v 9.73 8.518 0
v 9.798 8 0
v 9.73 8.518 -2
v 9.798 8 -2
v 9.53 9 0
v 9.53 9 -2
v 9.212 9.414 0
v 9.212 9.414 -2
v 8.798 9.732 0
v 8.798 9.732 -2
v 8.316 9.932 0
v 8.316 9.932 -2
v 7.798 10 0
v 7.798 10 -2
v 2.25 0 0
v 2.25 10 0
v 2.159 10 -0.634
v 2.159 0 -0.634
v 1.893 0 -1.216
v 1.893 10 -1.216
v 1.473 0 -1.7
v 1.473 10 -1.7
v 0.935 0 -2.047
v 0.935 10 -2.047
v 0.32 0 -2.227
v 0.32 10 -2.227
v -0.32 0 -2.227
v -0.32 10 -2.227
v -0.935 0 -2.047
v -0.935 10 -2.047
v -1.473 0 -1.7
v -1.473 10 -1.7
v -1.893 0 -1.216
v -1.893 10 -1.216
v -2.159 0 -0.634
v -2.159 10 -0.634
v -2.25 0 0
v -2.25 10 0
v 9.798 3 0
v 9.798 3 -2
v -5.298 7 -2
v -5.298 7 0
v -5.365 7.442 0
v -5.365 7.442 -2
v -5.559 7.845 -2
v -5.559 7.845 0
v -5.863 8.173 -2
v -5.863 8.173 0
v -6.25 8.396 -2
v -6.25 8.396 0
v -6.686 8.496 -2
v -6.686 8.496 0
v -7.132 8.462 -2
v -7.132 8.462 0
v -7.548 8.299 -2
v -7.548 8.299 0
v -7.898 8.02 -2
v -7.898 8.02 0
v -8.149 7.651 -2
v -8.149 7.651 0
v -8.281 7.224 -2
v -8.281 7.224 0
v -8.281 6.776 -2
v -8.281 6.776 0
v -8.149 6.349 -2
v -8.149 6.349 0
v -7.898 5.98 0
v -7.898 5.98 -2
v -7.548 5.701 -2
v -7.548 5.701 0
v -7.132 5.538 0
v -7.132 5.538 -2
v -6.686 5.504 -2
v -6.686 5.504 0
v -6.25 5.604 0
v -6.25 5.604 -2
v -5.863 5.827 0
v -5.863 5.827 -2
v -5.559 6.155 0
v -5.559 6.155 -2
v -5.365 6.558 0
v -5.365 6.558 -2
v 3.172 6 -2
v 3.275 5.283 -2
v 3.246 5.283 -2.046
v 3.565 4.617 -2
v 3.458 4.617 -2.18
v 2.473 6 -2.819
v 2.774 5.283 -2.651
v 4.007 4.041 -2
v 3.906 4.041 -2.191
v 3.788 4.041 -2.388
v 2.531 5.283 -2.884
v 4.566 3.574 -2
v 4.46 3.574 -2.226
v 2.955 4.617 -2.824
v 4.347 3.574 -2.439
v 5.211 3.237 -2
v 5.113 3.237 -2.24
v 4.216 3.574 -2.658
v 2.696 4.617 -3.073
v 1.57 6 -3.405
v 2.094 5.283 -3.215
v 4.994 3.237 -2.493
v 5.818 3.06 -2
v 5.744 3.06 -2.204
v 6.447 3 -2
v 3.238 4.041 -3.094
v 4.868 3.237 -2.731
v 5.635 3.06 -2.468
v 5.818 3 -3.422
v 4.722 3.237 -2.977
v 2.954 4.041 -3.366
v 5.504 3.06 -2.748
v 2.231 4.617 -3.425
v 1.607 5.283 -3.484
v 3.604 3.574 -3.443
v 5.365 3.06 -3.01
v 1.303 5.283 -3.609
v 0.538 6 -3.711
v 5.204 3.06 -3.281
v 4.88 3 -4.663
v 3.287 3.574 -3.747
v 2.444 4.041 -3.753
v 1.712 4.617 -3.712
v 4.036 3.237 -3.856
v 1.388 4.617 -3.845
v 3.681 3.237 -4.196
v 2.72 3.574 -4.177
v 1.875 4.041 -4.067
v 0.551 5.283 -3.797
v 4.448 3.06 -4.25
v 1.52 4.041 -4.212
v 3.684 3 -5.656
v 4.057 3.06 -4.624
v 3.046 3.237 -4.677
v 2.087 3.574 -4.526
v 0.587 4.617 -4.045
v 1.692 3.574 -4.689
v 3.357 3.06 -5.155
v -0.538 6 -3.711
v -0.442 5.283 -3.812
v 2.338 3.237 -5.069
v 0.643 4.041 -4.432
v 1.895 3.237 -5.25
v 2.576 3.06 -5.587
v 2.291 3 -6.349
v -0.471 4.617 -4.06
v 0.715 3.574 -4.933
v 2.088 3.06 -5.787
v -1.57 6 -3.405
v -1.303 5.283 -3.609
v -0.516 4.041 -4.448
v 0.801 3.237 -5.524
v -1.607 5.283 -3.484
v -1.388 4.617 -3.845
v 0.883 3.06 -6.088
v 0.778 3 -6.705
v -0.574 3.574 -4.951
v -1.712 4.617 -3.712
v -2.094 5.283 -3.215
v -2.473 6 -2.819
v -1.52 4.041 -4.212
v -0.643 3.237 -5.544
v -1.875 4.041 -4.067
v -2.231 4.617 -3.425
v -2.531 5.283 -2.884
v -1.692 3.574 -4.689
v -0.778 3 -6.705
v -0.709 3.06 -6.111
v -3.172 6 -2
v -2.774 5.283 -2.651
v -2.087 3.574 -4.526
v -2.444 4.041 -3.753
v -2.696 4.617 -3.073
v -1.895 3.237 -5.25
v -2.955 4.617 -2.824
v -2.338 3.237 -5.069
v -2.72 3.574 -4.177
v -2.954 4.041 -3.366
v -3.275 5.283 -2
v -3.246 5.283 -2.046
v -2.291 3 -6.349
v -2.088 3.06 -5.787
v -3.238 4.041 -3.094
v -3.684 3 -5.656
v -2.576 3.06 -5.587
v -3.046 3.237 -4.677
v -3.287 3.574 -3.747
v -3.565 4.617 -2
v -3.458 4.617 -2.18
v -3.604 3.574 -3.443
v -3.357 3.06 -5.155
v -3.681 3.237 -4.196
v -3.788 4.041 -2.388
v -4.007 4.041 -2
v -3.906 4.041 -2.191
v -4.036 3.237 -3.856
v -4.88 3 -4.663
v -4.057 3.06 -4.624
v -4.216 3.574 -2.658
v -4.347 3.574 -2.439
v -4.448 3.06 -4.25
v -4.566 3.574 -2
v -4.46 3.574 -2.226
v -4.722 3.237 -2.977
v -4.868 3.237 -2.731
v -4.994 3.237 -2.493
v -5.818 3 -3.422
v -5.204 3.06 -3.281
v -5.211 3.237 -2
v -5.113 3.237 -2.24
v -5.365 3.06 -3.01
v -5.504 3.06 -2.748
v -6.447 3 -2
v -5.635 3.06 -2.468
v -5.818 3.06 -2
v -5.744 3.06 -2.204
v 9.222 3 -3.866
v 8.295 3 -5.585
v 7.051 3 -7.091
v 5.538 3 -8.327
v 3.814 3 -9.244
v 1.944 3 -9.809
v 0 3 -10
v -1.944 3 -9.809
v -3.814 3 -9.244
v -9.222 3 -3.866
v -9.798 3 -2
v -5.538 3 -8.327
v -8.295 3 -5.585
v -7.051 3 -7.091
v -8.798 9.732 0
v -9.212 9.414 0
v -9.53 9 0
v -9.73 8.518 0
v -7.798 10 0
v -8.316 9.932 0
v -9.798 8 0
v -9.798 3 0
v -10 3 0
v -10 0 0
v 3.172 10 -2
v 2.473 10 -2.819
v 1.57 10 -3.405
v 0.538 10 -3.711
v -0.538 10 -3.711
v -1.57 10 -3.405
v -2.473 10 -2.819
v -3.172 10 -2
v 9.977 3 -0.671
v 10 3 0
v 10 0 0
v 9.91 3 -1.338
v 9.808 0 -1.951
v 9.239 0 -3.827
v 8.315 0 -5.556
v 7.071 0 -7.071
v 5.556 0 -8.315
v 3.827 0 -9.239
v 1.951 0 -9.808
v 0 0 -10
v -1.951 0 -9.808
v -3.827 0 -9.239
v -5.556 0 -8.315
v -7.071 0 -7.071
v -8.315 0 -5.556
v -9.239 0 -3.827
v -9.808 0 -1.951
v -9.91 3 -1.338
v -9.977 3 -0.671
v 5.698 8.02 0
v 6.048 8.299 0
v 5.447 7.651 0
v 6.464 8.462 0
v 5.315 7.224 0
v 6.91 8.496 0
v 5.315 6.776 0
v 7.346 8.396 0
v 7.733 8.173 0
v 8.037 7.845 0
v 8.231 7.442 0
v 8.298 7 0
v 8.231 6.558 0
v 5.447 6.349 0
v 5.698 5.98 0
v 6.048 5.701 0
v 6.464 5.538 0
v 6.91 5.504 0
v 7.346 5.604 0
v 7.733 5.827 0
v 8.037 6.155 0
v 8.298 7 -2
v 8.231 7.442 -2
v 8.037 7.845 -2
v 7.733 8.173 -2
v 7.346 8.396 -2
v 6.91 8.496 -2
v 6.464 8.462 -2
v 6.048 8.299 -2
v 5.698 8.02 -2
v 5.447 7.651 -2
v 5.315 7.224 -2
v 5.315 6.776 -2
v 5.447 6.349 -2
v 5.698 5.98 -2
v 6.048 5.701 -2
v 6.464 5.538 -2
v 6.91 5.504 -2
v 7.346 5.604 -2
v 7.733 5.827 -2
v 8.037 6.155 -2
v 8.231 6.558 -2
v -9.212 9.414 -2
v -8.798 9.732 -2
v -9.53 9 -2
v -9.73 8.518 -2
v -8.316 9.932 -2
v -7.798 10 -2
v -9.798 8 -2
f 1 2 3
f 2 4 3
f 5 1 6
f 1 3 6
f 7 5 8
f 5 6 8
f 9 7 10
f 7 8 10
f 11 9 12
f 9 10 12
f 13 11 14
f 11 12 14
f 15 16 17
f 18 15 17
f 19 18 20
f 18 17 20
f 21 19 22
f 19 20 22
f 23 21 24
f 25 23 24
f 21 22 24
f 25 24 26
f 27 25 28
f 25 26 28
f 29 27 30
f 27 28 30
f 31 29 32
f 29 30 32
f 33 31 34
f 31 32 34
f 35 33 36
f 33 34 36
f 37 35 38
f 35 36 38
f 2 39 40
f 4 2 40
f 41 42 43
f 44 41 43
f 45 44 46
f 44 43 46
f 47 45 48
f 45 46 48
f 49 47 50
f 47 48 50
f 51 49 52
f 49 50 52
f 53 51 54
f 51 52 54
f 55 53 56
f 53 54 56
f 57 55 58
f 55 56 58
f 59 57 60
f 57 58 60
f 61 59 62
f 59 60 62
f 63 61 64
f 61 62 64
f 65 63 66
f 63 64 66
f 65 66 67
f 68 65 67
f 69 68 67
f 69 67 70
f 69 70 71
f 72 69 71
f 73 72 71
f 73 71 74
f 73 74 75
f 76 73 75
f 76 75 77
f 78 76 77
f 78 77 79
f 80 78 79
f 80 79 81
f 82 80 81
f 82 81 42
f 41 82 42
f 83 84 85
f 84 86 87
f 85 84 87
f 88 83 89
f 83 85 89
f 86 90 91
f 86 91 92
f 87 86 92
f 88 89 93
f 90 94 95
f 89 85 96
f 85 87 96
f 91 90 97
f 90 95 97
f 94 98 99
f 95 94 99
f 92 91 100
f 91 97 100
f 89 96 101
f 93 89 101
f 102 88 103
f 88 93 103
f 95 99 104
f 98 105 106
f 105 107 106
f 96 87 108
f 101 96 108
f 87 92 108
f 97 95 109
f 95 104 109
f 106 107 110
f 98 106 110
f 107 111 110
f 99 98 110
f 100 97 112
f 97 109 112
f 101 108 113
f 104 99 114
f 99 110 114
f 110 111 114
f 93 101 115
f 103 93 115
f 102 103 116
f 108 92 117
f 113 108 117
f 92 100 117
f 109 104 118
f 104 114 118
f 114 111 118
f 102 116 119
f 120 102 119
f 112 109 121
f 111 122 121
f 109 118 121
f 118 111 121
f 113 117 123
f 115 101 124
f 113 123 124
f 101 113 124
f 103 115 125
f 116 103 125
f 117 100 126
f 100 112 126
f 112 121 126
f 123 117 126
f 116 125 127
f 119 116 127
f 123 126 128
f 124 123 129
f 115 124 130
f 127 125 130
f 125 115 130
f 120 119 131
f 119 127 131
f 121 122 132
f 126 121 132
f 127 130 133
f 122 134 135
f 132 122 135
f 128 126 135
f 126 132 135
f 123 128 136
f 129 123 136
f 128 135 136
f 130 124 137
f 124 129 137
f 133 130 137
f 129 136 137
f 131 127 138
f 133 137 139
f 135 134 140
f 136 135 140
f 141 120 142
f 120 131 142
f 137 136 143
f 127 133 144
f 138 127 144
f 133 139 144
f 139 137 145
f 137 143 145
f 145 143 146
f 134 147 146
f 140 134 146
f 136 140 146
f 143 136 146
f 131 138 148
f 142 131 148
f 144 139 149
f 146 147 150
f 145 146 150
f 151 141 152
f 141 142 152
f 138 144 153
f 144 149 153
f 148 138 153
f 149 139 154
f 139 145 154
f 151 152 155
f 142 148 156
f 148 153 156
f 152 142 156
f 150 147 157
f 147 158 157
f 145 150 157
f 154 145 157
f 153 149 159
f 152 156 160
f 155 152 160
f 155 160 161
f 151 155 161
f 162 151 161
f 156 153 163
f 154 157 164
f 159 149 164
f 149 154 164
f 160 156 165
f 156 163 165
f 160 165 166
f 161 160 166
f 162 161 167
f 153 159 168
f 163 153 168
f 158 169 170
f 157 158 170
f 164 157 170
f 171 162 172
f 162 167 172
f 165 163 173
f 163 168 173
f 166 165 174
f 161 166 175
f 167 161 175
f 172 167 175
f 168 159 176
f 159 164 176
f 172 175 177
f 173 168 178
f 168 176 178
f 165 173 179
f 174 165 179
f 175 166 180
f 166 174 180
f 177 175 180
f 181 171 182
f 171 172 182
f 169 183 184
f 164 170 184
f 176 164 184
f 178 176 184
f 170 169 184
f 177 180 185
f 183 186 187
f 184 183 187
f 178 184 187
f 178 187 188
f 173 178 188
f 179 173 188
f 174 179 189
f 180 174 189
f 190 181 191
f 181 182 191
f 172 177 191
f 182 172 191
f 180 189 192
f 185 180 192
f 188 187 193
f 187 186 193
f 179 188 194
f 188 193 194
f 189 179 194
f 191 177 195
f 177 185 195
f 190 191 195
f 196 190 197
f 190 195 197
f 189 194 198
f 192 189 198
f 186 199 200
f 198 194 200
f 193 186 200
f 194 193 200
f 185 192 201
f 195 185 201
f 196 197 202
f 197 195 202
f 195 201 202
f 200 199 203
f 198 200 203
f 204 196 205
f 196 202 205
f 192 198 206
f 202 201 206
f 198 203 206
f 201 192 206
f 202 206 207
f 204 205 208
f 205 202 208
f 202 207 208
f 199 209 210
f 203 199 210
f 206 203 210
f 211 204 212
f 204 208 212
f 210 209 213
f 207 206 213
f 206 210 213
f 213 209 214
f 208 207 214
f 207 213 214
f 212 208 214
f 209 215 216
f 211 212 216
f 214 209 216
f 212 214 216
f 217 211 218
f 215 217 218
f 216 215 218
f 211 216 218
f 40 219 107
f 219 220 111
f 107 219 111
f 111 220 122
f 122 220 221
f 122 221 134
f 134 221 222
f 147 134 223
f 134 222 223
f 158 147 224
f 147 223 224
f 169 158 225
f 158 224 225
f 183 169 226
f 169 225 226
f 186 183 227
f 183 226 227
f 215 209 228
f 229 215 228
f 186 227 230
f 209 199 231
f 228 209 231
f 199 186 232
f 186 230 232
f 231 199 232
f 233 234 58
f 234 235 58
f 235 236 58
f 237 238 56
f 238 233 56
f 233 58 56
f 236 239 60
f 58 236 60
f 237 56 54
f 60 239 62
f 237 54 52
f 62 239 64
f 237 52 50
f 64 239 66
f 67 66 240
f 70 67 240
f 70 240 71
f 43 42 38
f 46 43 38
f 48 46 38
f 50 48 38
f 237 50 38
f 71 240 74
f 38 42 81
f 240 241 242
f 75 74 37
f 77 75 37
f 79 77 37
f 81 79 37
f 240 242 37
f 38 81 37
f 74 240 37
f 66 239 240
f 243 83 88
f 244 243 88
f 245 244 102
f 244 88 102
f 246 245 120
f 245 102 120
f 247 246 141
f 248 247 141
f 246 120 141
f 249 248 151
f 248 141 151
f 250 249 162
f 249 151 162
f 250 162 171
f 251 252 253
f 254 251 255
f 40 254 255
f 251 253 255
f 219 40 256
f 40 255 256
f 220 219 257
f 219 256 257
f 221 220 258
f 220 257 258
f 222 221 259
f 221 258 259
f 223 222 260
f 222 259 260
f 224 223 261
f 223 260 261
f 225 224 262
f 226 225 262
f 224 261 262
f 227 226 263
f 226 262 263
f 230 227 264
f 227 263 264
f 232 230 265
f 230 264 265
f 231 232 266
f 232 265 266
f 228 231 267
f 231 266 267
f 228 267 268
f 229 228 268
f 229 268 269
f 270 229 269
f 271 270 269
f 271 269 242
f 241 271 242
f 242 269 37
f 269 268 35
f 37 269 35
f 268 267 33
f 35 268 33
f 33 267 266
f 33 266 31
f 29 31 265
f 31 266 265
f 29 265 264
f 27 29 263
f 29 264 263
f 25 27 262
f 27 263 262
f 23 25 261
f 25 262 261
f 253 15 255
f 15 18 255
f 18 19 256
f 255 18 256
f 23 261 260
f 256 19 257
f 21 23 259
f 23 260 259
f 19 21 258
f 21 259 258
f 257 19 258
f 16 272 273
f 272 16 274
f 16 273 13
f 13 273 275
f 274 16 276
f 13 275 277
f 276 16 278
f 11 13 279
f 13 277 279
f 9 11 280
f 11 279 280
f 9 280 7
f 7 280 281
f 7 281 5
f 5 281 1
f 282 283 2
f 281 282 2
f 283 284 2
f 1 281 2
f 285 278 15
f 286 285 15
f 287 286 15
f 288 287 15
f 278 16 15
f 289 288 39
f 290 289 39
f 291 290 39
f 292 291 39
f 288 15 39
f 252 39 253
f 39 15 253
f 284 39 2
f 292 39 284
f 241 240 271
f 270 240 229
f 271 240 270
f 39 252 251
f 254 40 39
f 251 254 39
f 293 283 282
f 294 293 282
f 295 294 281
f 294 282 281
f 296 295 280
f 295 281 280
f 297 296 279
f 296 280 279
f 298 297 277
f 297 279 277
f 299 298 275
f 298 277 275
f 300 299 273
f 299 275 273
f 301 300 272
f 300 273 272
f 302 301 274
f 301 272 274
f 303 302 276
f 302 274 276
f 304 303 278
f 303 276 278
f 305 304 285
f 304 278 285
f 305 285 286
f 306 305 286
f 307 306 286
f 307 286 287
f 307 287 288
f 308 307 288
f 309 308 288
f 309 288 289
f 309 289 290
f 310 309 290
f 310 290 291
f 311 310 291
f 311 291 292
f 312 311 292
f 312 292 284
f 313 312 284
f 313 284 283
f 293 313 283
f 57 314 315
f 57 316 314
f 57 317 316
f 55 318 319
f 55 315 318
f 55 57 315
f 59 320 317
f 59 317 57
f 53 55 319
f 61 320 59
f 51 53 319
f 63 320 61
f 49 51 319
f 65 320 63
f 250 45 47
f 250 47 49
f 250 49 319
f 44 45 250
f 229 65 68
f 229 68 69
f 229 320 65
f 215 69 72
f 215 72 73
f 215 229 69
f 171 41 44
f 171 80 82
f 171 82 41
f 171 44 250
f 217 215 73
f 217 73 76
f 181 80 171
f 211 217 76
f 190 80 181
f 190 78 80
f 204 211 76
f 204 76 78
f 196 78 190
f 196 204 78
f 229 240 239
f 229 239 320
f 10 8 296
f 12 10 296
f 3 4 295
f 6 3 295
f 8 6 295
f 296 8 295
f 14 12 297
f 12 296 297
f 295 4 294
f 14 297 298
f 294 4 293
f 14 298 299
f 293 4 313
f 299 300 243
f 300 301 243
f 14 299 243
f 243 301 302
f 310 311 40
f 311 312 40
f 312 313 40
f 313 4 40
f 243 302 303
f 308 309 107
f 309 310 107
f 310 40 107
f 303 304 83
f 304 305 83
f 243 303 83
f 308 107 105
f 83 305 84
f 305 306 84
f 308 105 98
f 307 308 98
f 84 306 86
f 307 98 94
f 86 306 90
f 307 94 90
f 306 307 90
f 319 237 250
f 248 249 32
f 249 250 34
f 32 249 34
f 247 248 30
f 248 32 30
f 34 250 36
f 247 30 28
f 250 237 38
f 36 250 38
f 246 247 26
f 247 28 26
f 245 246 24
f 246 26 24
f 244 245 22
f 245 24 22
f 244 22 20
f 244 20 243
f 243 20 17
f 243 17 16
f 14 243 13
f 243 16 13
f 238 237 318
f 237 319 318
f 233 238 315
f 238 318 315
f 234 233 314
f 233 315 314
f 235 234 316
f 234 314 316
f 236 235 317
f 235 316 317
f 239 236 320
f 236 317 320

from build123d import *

# Parameters (mm, degrees)
FILLET1_R             = 3
BOSS_EXTRUDE1_REACH   = 17.78
SKETCH3_W             = 6.625814586
SKETCH3_H             = 4
SKETCH2_W             = 30
SKETCH2_H             = 15
CUT_EXTRUDE1_DEPTH    = 18.320508133
F_3_0MM_DOWEL_HOLE1_D = 3
FILLET2_R             = 2


with BuildPart() as part:
    # Sketch1 → Revolve1 (revolve)
    with BuildSketch(Plane.XY):
        Polygon((2.25, 0), (2.25, 10), (3.75, 10), (3.75, 3), (10, 3), (10, 0), align=None)
    revolve(axis=Axis((0, -739.105470896, 0), (0, 1, 0)))

    # Fillet1
    fillet1_edges = [part.edges().sort_by_distance(p)[0] for p in [
        (-3.75, 3, 0),
    ]]
    fillet(fillet1_edges, radius=FILLET1_R)

    # Boss-Extrude1: up to this face of the body (flat: up to its plane)
    boss_extrude1_end = Plane(part.part.faces().sort_by_distance((-2.356066017, 10, 0))[0])
    # Sketch3 → Boss-Extrude1 (add, up to the picked face)
    with BuildSketch(Plane(origin=(0, 3, 0), x_dir=(1, 0, 0), z_dir=(0, 1, 0)), mode=Mode.PRIVATE) as boss_extrude1_sk1:
        with Locations((-6.485051678, 0)):
            Rectangle(SKETCH3_W, SKETCH3_H)
    boss_extrude1_tool1 = split(extrude(boss_extrude1_sk1.sketch, amount=BOSS_EXTRUDE1_REACH, mode=Mode.PRIVATE), bisect_by=boss_extrude1_end, keep=Keep.BOTH, mode=Mode.PRIVATE)
    boss_extrude1 = boss_extrude1_tool1.solids().sort_by(Axis((-6.485052, 3, 0), (0, 1, 0)))[0]
    add(boss_extrude1)

    # Mirror1: Boss-Extrude1 across plane
    add(boss_extrude1.mirror(Plane(origin=(0, 0, 0), x_dir=(0, 0, 1), z_dir=(1, 0, 0))))

    # Sketch2 → Cut-Extrude1 (cut, through all)
    with BuildSketch(Plane(origin=(0, 0, 0), x_dir=(1, 0, 0), z_dir=(0, 1, 0))):
        with Locations((0, -7.5)):
            Rectangle(SKETCH2_W, SKETCH2_H)
    extrude(amount=CUT_EXTRUDE1_DEPTH, mode=Mode.SUBTRACT)

    # Ø3.0mm Dowel Hole1 (through all)
    with Locations(Plane(origin=(0, 0, -2), x_dir=(-1, 0, 0), z_dir=(0, 0, -1))):
        with Locations((6.797958971, 7), (-6.797958971, 7)):
            Hole(F_3_0MM_DOWEL_HOLE1_D / 2)

    # Fillet2
    fillet2_edges = [part.edges().sort_by_distance(p)[0] for p in [
        (-9.797958971, 10, -1),
        (9.797958971, 10, -1),
    ]]
    fillet(fillet2_edges, radius=FILLET2_R)


solid = part.part
